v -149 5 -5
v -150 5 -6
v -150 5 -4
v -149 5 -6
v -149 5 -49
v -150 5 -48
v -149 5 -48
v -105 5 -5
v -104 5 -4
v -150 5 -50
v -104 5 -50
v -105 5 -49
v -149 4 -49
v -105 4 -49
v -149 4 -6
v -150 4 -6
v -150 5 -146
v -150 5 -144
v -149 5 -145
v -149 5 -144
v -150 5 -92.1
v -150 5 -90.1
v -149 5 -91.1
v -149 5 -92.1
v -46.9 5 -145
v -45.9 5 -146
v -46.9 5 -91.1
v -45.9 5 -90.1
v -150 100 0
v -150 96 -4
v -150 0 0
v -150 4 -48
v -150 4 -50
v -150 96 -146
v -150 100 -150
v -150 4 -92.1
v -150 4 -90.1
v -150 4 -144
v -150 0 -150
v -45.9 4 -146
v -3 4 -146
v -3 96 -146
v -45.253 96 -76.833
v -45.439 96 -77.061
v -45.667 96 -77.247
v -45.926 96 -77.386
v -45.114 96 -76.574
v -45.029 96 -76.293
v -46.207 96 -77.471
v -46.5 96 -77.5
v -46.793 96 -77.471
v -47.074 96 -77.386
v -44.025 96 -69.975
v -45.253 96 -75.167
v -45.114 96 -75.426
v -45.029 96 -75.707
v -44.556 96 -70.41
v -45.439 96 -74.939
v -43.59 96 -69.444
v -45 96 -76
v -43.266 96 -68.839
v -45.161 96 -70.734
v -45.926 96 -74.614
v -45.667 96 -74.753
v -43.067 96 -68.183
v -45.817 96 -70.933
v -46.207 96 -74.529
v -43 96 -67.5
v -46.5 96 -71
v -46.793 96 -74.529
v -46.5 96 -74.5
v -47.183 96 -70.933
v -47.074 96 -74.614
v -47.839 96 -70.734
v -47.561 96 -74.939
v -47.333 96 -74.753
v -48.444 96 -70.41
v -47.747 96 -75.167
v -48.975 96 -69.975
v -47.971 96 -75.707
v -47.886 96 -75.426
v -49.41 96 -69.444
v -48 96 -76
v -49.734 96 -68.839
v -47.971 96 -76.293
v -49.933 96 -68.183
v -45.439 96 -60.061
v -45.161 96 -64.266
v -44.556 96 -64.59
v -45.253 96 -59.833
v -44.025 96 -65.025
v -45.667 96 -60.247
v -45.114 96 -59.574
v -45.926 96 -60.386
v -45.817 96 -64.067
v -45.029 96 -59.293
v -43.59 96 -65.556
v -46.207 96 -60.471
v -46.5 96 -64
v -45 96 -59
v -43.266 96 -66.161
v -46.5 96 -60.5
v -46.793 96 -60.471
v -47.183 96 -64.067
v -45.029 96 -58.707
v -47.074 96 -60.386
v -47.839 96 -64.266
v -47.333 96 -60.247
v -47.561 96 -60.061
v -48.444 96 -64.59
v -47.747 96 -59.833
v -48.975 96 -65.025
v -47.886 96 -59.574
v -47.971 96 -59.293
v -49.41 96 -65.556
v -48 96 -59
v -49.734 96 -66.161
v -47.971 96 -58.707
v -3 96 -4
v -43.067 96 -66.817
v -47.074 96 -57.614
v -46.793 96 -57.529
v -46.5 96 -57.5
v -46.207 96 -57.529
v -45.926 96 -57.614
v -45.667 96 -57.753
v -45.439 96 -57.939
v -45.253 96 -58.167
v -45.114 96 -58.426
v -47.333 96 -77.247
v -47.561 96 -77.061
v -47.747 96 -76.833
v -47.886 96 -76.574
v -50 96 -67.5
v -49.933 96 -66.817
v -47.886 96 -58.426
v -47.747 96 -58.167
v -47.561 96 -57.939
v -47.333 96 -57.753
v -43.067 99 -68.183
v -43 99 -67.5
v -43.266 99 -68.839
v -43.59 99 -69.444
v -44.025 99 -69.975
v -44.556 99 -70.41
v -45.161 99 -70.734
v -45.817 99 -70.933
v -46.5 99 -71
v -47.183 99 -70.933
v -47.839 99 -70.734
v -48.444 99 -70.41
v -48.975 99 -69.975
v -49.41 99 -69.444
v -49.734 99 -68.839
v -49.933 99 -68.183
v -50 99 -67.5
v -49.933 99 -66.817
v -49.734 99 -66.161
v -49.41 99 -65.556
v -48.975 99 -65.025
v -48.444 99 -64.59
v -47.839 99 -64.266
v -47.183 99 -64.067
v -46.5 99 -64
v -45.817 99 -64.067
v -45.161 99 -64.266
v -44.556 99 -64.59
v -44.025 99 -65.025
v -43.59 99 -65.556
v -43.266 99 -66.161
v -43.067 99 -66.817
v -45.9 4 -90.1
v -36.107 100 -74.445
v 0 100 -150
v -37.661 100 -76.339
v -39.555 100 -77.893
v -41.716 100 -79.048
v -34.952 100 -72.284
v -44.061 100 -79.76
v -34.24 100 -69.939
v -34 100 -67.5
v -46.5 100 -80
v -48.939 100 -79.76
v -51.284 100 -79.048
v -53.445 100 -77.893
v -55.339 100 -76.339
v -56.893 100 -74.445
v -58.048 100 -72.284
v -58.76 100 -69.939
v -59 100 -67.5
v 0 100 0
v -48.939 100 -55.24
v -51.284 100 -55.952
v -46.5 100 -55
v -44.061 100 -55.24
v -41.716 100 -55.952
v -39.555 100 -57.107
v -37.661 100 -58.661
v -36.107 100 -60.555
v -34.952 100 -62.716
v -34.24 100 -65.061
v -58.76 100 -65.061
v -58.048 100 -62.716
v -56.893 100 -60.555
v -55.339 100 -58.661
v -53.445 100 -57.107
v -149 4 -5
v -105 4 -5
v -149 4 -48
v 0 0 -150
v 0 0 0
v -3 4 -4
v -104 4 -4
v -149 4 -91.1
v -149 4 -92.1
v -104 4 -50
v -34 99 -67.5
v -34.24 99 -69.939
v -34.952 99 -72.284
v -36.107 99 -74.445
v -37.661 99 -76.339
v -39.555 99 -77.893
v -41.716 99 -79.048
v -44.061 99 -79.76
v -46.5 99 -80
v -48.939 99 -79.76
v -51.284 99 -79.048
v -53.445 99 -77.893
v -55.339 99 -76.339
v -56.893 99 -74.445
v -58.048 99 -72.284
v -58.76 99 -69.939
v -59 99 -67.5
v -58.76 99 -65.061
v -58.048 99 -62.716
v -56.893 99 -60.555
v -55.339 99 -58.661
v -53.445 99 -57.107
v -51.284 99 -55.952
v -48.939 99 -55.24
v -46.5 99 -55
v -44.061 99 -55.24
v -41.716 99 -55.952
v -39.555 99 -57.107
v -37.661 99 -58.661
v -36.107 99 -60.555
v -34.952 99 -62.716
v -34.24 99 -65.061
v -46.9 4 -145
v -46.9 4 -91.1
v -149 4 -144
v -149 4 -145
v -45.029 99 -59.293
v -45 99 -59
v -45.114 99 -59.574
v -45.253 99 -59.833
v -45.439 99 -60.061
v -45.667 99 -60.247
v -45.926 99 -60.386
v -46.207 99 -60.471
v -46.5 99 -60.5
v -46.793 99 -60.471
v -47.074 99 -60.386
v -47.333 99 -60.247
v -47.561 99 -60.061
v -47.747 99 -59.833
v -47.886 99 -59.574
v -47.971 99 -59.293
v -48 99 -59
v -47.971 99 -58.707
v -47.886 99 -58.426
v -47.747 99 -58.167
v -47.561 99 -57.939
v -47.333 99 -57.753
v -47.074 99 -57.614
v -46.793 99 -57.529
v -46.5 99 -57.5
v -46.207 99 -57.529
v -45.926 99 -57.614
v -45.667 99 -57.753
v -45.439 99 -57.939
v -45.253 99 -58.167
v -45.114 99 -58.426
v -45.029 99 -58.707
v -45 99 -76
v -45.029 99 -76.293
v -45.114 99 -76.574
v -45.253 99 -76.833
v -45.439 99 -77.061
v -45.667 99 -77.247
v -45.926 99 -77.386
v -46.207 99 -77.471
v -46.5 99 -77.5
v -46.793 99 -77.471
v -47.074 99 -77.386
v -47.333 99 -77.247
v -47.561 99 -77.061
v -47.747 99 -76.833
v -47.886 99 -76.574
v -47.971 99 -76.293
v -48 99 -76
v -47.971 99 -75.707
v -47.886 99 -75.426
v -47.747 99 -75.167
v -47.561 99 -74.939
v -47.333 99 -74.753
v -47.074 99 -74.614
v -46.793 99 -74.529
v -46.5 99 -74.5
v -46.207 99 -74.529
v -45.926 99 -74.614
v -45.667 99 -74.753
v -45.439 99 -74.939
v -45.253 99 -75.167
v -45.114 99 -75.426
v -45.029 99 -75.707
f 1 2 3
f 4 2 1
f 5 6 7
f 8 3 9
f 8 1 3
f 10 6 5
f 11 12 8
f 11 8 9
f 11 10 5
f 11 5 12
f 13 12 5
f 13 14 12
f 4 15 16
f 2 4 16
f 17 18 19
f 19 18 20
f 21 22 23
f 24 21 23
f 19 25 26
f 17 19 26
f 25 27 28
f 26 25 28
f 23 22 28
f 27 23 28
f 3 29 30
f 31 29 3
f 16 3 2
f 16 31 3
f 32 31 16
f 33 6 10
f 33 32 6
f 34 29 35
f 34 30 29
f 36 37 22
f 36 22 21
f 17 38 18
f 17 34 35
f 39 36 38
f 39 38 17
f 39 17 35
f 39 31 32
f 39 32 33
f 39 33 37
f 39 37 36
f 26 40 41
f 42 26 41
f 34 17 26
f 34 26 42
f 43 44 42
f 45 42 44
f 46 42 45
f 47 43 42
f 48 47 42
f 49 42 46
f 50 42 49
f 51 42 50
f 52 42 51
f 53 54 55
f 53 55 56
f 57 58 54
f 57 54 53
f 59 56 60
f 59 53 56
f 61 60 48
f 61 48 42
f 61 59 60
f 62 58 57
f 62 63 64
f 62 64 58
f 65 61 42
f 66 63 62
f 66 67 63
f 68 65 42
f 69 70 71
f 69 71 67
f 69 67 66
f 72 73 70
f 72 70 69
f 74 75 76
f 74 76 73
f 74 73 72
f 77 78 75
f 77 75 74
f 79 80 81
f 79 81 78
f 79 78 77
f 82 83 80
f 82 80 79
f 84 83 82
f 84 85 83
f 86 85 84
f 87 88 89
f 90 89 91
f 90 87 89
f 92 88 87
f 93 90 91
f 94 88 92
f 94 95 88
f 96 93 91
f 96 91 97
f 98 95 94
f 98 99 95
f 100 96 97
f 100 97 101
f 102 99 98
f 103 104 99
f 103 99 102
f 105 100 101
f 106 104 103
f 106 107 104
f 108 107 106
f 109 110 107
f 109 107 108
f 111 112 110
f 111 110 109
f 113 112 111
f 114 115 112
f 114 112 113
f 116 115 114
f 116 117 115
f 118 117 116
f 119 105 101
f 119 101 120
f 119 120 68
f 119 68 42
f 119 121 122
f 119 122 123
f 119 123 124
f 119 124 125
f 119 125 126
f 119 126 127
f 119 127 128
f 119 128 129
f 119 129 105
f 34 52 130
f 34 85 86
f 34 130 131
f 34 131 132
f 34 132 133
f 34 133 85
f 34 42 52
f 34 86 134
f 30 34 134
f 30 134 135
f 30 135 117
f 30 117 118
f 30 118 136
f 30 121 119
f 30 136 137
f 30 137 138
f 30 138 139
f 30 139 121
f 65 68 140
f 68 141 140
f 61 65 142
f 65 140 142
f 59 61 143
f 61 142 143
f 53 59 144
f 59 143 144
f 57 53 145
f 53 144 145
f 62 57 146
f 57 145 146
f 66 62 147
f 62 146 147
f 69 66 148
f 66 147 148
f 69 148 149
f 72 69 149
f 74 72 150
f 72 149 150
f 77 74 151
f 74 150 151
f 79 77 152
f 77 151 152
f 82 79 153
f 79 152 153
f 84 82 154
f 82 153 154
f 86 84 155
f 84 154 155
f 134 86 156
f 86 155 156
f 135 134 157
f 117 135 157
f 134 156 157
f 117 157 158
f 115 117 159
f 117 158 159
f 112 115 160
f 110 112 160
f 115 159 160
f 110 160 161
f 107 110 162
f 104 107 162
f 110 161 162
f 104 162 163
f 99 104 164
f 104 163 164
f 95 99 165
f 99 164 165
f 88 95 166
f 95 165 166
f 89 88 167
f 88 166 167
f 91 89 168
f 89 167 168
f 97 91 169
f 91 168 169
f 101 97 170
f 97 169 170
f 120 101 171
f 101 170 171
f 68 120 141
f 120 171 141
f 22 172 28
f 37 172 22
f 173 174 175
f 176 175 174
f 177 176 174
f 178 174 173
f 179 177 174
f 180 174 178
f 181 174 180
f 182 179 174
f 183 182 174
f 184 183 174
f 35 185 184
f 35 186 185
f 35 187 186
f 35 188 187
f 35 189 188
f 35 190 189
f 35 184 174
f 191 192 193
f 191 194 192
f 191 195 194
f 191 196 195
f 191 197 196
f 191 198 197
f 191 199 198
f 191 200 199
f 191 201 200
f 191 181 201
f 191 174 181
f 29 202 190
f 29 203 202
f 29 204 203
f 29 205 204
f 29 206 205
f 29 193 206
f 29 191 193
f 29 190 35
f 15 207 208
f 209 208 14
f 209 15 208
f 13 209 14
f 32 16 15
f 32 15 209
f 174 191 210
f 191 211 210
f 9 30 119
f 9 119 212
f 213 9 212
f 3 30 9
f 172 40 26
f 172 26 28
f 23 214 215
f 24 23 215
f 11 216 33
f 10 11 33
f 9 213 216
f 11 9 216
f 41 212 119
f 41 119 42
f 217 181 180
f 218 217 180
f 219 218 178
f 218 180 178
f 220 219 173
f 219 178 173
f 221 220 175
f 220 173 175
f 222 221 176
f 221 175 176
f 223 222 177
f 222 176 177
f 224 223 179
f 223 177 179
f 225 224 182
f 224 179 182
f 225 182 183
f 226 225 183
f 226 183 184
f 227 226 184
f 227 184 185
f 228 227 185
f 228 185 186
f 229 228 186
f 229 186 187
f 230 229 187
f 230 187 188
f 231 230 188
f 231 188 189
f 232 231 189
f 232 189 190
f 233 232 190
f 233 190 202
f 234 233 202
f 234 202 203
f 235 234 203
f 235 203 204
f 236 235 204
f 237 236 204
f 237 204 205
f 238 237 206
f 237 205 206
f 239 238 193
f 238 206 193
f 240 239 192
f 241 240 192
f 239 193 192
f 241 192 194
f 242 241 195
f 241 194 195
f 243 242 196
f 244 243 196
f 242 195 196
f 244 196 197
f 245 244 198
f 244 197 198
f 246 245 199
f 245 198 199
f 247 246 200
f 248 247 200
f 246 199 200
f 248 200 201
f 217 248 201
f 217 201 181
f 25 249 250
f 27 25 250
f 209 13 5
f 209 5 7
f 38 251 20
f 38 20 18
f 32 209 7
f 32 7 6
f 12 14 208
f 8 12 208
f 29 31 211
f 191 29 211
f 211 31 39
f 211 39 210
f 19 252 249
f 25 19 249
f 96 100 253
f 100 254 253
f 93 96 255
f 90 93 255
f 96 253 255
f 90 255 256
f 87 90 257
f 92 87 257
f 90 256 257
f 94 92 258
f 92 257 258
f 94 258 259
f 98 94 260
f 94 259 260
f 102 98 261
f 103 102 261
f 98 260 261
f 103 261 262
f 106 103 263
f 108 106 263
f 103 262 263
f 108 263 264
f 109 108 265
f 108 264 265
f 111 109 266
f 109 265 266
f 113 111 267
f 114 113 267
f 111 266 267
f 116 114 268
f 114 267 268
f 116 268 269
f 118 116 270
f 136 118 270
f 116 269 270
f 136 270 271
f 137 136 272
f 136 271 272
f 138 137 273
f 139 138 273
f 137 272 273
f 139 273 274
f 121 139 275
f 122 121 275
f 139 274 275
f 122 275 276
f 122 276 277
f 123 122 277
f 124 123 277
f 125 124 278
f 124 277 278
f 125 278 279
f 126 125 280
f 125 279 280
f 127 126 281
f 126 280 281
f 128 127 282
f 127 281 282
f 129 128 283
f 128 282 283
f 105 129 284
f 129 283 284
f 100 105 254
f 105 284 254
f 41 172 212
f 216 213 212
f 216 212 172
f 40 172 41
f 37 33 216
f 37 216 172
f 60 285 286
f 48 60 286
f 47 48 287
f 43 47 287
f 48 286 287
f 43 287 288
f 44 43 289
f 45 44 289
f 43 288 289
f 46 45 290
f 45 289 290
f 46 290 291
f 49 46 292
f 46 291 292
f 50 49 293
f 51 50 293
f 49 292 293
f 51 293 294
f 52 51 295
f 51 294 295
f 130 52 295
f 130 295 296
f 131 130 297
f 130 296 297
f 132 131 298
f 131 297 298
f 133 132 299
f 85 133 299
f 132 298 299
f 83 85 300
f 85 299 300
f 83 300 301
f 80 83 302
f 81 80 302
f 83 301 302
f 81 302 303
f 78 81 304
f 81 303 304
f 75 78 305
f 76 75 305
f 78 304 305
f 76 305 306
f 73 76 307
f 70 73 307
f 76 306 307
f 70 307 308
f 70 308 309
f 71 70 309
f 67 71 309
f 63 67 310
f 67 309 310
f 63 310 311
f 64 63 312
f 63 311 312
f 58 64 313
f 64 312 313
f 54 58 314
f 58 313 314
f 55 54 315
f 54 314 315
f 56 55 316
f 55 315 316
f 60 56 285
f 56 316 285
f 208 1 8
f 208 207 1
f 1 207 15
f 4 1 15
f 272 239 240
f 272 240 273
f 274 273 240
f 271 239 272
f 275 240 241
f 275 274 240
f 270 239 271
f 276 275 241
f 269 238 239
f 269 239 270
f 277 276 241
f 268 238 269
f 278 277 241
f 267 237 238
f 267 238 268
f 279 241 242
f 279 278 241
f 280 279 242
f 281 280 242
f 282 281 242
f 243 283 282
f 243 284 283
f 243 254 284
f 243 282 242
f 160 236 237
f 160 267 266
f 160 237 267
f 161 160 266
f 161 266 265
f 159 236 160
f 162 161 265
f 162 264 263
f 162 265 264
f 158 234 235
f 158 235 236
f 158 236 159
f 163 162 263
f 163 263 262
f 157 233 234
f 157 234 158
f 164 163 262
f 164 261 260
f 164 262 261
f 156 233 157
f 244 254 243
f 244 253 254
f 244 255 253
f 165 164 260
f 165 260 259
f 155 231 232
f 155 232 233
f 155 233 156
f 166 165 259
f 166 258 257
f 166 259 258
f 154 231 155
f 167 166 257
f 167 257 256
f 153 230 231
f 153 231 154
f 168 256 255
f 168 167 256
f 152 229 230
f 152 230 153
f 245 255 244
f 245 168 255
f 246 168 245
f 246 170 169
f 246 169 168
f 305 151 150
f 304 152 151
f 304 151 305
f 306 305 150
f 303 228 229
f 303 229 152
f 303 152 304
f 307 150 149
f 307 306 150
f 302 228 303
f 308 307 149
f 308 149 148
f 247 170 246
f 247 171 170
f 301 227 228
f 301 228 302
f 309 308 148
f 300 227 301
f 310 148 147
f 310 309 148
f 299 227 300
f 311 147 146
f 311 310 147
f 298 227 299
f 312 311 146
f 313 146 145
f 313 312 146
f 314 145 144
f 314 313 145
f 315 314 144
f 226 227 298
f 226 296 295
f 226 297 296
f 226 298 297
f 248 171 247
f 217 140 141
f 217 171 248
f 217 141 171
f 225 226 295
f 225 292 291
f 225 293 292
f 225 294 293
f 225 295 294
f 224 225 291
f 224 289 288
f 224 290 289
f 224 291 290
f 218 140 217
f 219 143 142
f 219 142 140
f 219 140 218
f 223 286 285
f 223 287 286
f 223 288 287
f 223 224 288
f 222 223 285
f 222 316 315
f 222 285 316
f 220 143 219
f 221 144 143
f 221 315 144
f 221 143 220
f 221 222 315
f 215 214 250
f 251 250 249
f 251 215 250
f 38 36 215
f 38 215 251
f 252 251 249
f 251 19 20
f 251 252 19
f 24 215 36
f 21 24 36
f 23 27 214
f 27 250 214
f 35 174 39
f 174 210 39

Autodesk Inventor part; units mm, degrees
ref_plane "YZ Plane" through (0, 0, 0) normal (1, 0, 0) x (0, 1, 0)
ref_plane "XZ Plane" through (0, 0, 0) normal (0, 1, 0) x (-1, 0, 0)
ref_plane "XY Plane" through (0, 0, 0) normal (0, 0, 1) x (1, 0, 0)
sketch "Boceto1" plane through (0, 0, 0) normal (0, 1, 0) x (-1, 0, 0)
  point P0 (0, 0)
extrude "Extrusión1" [suppressed]
feature "Vaciado1" [suppressed]
sketch "Boceto2" plane through (0, 70, 0) normal (0, 1, 0) x (1, 0, 0)
  line L0 (-5, 5) -> (-5, 145) projected
  line L1 (-145, 145) -> (-145, 5) projected
  line L2 (-145, 5) -> (-5, 5) projected
  line L3 (-5, 145) -> (-145, 145) projected
  line L4 (-150, 0) -> (0, 0) projected
  circle A0 centre (-46.4922, 78) radius 12.5
  circle A1 centre (-46.4922, 78) radius 13.5
hole "Agujero1" [suppressed]
sketch "Boceto3" plane through (0, 70, 0) normal (0, 1, 0) x (1, 0, 0)
  point P0 (0, 0)
sketch "Boceto4" plane through (0, 0, 0) normal (0, 1, 0) x (-1, 0, 0)
  point P0 (0, 0)
extrude "Extrusión2" [suppressed]
feature "Vaciado2" [suppressed]
sketch "Boceto5" plane through (0, 100, 0) normal (0, 1, 0) x (1, 0, 0)
  line L0 (0, 0) -> (0, 150) projected
  circle A0 centre (-46.5, 67.5) radius 14.5
extrude "Extrusión3" [suppressed]
sketch "Boceto6" plane through (0, 100, 0) normal (0, 1, 0) x (1, 0, 0)
  circle A0 centre (-46.5, 67.5) radius 12.5
extrude "Extrusión4" [suppressed]
sketch "Boceto7" plane through (-46.5, 31, -67.5) normal (0, -1, 0) x (1, 0, 0)
  point P0 (46.5, 67.5)
sketch "Boceto8" plane through (-46.5, 33, -67.5) normal (0, 1, 0) x (1, 0, 0)
  point P0 (46.5, -67.5)
sketch "Boceto9" plane through (0, 100, 0) normal (0, 1, 0) x (1, 0, 0)
  point P0 (0, 0)
sketch "Boceto10" plane through (0, 0, 0) normal (0, 1, 0) x (-1, 0, 0)
  line L0 (0, 0) -> (0, -150)
  line L1 (0, -150) -> (150, -150)
  line L2 (150, -150) -> (150, 0)
  line L3 (150, 0) -> (0, 0)
extrude "Extrusión5" add sketch "Boceto10" along normal blind 100
shell "Vaciado3" thickness 3 removed faces 1 at (-150, 33.3333, -100)
sketch "Boceto11" plane through (0, 100, 0) normal (0, 1, 0) x (1, 0, 0)
  line L0 (-150, 0) -> (0, 0) projected
  line L1 (0, 0) -> (0, 150) projected
  circle A0 centre (-46.5, 67.5) radius 12.5002
extrude "Extrusión6" add sketch "Boceto11" against normal blind 4
sketch "Boceto12" plane through (0, 100, 0) normal (0, 1, 0) x (1, 0, 0)
  circle A0 centre (-46.5, 67.5) radius 12.5
  point P0 (0, 0)
extrude "Extrusión7" cut sketch "Boceto12" against normal blind 1
sketch "Boceto13" plane through (0, 100, 0) normal (0, 1, 0) x (1, 0, 0)
  point P0 (0, 0)
sketch "Boceto14" plane through (-46.5, 96, -67.5) normal (0, -1, 0) x (1, 0, 0)
  circle A0 centre (0, 0) radius 3.5
  point P0 (46.5, 67.5)
extrude "Extrusión8" cut sketch "Boceto14" against normal blind 3
sketch "Boceto15" plane through (-46.5, 99, -67.5) normal (0, 1, 0) x (1, 0, 0)
  circle A0 centre (0, -8.5) radius 1.5
  circle A1 centre (0, 8.5) radius 1.5
  point P0 (46.5, -67.5)
extrude "Extrusión9" cut sketch "Boceto15" against normal blind 3
sketch "Boceto16" plane through (-150, 0, -150) normal (-1, 0, 0) x (0, 0, 1)
  line L0 (3, 97) -> (147, 97) projected
  line L1 (4, 96) -> (146, 96)
  line L2 (147, 3) -> (3, 3) projected
  line L3 (4, 4) -> (4, 96)
  line L4 (146, 4) -> (4, 4)
  line L5 (146, 96) -> (146, 4)
  line L6 (3, 97) -> (147, 97)
  line L7 (147, 3) -> (147, 97) projected
  line L8 (147, 3) -> (3, 3)
  line L9 (3, 3) -> (3, 97) projected
  line L10 (3, 97) -> (3, 3)
  line L11 (147, 97) -> (147, 3)
  point P0 (150, 0)
sketch "Boceto17" plane through (-150, 3, -147) normal (0, 0, 1) x (1, 0, 0)
  point P0 (150, -3)
extrude "Extrusión10" add sketch "Boceto16" against normal blind 148
sketch "Boceto18" plane through (-46.5, 97, -67.5) normal (0, 1, 0) x (1, 0, 0)
  circle A0 centre (0, 0) radius 3.5
  point P0 (46.5, -67.5)
extrude "Extrusión11" cut sketch "Boceto18" against normal blind 1
sketch "Boceto19" plane through (-150, 0, -150) normal (-1, 0, 0) x (0, 0, 1)
  point P0 (150, 0)
sketch "Boceto20" plane through (-46.5, 97, -76) normal (0, 1, 0) x (1, 0, 0)
  circle A0 centre (0, 0) radius 1.5 projected
  circle A1 centre (0, 0) radius 1.5
  circle A2 centre (0, -17) radius 1.5
  point P0 (46.5, -76)
extrude "Extrusión12" cut sketch "Boceto20" against normal blind 1
sketch "Boceto21" plane through (-150, 0, -150) normal (-1, 0, 0) x (0, 0, 1)
  point P0 (150, 0)
sketch "Boceto22" plane through (-150, 4, -4) normal (0, 1, 0) x (1, 0, 0)
  point P0 (150, -4)
  point P1 (0, 142)
sketch "Boceto23" plane through (0, 0, 0) normal (0, -1, 0) x (1, 0, 0)
  point P0 (0, 0)
extrude "Extrusión13" [suppressed]
sketch "Boceto24" plane through (0, 5, 0) normal (0, 1, 0) x (1, 0, 0)
  point P0 (0, 0)
sketch "Boceto25" plane through (0, 0, 0) normal (0, -1, 0) x (1, 0, 0)
  line L0 (-150, -146) -> (-150, -4) projected
  line L1 (-150, -146) -> (-45.9, -146)
  line L2 (-45.9, -146) -> (-45.9, -90.1)
  line L3 (-45.9, -90.1) -> (-150, -90.1)
  line L4 (-150, -146) -> (-150, -145)
  line L5 (-149, -145) -> (-46.9, -145)
  line L6 (-45.9, -146) -> (-46.9, -146)
  line L7 (-46.9, -145) -> (-46.9, -91.1)
  line L8 (-45.9, -90.1) -> (-45.9, -91.1)
  line L9 (-46.9, -91.1) -> (-149, -91.1)
  line L10 (-150, -90.1) -> (-149, -90.1)
  line L11 (-149, -145) -> (-149, -144)
  line L12 (-149, -144) -> (-150, -144)
  line L13 (-149, -91.1) -> (-149, -92.1)
  line L14 (-149, -92.1) -> (-150, -92.1)
  line L15 (-149, -91.1) -> (-149, -92.1)
  line L16 (-149, -144) -> (-149, -145)
  line L17 (-150, -146) -> (-150, -144)
  line L18 (-150, -92.1) -> (-150, -90.1)
  point P0 (0, 0)
extrude "Extrusión14" add sketch "Boceto25" against normal blind 5 contours L0 L12 L11 L5 L7 L9 L13 L14 L3 L2 L1
sketch "Boceto26" plane through (-150, 4, -4) normal (0, 1, 0) x (1, 0, 0)
  line L0 (0, 0) -> (147, 0) projected
  line L1 (0, 0) -> (46, 0)
  line L2 (46, 0) -> (46, 46)
  line L3 (46, 46) -> (0, 46)
  line L4 (0, 0) -> (0, 86.1) projected
  line L5 (46, 46) -> (45, 46)
  line L6 (46, 46) -> (46, 45)
  line L7 (45, 45) -> (1, 45)
  line L8 (0, 46) -> (1, 46)
  line L9 (0, 0) -> (0, 1)
  line L10 (46, 46) -> (45, 46)
  line L11 (45, 45) -> (45, 1)
  line L12 (1, 1) -> (45, 1)
  line L13 (1, 45) -> (1, 44)
  line L14 (1, 44) -> (0, 44)
  line L15 (1, 1) -> (1, 2)
  line L16 (1, 2) -> (0, 2)
  line L17 (0, 46) -> (0, 44)
  line L18 (0, 2) -> (0, 0)
  line L19 (1, 45) -> (1, 44)
  line L20 (1, 2) -> (1, 1)
  point P0 (150, -4)
extrude "Extrusión15" add sketch "Boceto26" along normal blind 1 contours L4 L16 L15 L12 L11 L7 L13 L14 L3 L2 L0
properties part number "base"
